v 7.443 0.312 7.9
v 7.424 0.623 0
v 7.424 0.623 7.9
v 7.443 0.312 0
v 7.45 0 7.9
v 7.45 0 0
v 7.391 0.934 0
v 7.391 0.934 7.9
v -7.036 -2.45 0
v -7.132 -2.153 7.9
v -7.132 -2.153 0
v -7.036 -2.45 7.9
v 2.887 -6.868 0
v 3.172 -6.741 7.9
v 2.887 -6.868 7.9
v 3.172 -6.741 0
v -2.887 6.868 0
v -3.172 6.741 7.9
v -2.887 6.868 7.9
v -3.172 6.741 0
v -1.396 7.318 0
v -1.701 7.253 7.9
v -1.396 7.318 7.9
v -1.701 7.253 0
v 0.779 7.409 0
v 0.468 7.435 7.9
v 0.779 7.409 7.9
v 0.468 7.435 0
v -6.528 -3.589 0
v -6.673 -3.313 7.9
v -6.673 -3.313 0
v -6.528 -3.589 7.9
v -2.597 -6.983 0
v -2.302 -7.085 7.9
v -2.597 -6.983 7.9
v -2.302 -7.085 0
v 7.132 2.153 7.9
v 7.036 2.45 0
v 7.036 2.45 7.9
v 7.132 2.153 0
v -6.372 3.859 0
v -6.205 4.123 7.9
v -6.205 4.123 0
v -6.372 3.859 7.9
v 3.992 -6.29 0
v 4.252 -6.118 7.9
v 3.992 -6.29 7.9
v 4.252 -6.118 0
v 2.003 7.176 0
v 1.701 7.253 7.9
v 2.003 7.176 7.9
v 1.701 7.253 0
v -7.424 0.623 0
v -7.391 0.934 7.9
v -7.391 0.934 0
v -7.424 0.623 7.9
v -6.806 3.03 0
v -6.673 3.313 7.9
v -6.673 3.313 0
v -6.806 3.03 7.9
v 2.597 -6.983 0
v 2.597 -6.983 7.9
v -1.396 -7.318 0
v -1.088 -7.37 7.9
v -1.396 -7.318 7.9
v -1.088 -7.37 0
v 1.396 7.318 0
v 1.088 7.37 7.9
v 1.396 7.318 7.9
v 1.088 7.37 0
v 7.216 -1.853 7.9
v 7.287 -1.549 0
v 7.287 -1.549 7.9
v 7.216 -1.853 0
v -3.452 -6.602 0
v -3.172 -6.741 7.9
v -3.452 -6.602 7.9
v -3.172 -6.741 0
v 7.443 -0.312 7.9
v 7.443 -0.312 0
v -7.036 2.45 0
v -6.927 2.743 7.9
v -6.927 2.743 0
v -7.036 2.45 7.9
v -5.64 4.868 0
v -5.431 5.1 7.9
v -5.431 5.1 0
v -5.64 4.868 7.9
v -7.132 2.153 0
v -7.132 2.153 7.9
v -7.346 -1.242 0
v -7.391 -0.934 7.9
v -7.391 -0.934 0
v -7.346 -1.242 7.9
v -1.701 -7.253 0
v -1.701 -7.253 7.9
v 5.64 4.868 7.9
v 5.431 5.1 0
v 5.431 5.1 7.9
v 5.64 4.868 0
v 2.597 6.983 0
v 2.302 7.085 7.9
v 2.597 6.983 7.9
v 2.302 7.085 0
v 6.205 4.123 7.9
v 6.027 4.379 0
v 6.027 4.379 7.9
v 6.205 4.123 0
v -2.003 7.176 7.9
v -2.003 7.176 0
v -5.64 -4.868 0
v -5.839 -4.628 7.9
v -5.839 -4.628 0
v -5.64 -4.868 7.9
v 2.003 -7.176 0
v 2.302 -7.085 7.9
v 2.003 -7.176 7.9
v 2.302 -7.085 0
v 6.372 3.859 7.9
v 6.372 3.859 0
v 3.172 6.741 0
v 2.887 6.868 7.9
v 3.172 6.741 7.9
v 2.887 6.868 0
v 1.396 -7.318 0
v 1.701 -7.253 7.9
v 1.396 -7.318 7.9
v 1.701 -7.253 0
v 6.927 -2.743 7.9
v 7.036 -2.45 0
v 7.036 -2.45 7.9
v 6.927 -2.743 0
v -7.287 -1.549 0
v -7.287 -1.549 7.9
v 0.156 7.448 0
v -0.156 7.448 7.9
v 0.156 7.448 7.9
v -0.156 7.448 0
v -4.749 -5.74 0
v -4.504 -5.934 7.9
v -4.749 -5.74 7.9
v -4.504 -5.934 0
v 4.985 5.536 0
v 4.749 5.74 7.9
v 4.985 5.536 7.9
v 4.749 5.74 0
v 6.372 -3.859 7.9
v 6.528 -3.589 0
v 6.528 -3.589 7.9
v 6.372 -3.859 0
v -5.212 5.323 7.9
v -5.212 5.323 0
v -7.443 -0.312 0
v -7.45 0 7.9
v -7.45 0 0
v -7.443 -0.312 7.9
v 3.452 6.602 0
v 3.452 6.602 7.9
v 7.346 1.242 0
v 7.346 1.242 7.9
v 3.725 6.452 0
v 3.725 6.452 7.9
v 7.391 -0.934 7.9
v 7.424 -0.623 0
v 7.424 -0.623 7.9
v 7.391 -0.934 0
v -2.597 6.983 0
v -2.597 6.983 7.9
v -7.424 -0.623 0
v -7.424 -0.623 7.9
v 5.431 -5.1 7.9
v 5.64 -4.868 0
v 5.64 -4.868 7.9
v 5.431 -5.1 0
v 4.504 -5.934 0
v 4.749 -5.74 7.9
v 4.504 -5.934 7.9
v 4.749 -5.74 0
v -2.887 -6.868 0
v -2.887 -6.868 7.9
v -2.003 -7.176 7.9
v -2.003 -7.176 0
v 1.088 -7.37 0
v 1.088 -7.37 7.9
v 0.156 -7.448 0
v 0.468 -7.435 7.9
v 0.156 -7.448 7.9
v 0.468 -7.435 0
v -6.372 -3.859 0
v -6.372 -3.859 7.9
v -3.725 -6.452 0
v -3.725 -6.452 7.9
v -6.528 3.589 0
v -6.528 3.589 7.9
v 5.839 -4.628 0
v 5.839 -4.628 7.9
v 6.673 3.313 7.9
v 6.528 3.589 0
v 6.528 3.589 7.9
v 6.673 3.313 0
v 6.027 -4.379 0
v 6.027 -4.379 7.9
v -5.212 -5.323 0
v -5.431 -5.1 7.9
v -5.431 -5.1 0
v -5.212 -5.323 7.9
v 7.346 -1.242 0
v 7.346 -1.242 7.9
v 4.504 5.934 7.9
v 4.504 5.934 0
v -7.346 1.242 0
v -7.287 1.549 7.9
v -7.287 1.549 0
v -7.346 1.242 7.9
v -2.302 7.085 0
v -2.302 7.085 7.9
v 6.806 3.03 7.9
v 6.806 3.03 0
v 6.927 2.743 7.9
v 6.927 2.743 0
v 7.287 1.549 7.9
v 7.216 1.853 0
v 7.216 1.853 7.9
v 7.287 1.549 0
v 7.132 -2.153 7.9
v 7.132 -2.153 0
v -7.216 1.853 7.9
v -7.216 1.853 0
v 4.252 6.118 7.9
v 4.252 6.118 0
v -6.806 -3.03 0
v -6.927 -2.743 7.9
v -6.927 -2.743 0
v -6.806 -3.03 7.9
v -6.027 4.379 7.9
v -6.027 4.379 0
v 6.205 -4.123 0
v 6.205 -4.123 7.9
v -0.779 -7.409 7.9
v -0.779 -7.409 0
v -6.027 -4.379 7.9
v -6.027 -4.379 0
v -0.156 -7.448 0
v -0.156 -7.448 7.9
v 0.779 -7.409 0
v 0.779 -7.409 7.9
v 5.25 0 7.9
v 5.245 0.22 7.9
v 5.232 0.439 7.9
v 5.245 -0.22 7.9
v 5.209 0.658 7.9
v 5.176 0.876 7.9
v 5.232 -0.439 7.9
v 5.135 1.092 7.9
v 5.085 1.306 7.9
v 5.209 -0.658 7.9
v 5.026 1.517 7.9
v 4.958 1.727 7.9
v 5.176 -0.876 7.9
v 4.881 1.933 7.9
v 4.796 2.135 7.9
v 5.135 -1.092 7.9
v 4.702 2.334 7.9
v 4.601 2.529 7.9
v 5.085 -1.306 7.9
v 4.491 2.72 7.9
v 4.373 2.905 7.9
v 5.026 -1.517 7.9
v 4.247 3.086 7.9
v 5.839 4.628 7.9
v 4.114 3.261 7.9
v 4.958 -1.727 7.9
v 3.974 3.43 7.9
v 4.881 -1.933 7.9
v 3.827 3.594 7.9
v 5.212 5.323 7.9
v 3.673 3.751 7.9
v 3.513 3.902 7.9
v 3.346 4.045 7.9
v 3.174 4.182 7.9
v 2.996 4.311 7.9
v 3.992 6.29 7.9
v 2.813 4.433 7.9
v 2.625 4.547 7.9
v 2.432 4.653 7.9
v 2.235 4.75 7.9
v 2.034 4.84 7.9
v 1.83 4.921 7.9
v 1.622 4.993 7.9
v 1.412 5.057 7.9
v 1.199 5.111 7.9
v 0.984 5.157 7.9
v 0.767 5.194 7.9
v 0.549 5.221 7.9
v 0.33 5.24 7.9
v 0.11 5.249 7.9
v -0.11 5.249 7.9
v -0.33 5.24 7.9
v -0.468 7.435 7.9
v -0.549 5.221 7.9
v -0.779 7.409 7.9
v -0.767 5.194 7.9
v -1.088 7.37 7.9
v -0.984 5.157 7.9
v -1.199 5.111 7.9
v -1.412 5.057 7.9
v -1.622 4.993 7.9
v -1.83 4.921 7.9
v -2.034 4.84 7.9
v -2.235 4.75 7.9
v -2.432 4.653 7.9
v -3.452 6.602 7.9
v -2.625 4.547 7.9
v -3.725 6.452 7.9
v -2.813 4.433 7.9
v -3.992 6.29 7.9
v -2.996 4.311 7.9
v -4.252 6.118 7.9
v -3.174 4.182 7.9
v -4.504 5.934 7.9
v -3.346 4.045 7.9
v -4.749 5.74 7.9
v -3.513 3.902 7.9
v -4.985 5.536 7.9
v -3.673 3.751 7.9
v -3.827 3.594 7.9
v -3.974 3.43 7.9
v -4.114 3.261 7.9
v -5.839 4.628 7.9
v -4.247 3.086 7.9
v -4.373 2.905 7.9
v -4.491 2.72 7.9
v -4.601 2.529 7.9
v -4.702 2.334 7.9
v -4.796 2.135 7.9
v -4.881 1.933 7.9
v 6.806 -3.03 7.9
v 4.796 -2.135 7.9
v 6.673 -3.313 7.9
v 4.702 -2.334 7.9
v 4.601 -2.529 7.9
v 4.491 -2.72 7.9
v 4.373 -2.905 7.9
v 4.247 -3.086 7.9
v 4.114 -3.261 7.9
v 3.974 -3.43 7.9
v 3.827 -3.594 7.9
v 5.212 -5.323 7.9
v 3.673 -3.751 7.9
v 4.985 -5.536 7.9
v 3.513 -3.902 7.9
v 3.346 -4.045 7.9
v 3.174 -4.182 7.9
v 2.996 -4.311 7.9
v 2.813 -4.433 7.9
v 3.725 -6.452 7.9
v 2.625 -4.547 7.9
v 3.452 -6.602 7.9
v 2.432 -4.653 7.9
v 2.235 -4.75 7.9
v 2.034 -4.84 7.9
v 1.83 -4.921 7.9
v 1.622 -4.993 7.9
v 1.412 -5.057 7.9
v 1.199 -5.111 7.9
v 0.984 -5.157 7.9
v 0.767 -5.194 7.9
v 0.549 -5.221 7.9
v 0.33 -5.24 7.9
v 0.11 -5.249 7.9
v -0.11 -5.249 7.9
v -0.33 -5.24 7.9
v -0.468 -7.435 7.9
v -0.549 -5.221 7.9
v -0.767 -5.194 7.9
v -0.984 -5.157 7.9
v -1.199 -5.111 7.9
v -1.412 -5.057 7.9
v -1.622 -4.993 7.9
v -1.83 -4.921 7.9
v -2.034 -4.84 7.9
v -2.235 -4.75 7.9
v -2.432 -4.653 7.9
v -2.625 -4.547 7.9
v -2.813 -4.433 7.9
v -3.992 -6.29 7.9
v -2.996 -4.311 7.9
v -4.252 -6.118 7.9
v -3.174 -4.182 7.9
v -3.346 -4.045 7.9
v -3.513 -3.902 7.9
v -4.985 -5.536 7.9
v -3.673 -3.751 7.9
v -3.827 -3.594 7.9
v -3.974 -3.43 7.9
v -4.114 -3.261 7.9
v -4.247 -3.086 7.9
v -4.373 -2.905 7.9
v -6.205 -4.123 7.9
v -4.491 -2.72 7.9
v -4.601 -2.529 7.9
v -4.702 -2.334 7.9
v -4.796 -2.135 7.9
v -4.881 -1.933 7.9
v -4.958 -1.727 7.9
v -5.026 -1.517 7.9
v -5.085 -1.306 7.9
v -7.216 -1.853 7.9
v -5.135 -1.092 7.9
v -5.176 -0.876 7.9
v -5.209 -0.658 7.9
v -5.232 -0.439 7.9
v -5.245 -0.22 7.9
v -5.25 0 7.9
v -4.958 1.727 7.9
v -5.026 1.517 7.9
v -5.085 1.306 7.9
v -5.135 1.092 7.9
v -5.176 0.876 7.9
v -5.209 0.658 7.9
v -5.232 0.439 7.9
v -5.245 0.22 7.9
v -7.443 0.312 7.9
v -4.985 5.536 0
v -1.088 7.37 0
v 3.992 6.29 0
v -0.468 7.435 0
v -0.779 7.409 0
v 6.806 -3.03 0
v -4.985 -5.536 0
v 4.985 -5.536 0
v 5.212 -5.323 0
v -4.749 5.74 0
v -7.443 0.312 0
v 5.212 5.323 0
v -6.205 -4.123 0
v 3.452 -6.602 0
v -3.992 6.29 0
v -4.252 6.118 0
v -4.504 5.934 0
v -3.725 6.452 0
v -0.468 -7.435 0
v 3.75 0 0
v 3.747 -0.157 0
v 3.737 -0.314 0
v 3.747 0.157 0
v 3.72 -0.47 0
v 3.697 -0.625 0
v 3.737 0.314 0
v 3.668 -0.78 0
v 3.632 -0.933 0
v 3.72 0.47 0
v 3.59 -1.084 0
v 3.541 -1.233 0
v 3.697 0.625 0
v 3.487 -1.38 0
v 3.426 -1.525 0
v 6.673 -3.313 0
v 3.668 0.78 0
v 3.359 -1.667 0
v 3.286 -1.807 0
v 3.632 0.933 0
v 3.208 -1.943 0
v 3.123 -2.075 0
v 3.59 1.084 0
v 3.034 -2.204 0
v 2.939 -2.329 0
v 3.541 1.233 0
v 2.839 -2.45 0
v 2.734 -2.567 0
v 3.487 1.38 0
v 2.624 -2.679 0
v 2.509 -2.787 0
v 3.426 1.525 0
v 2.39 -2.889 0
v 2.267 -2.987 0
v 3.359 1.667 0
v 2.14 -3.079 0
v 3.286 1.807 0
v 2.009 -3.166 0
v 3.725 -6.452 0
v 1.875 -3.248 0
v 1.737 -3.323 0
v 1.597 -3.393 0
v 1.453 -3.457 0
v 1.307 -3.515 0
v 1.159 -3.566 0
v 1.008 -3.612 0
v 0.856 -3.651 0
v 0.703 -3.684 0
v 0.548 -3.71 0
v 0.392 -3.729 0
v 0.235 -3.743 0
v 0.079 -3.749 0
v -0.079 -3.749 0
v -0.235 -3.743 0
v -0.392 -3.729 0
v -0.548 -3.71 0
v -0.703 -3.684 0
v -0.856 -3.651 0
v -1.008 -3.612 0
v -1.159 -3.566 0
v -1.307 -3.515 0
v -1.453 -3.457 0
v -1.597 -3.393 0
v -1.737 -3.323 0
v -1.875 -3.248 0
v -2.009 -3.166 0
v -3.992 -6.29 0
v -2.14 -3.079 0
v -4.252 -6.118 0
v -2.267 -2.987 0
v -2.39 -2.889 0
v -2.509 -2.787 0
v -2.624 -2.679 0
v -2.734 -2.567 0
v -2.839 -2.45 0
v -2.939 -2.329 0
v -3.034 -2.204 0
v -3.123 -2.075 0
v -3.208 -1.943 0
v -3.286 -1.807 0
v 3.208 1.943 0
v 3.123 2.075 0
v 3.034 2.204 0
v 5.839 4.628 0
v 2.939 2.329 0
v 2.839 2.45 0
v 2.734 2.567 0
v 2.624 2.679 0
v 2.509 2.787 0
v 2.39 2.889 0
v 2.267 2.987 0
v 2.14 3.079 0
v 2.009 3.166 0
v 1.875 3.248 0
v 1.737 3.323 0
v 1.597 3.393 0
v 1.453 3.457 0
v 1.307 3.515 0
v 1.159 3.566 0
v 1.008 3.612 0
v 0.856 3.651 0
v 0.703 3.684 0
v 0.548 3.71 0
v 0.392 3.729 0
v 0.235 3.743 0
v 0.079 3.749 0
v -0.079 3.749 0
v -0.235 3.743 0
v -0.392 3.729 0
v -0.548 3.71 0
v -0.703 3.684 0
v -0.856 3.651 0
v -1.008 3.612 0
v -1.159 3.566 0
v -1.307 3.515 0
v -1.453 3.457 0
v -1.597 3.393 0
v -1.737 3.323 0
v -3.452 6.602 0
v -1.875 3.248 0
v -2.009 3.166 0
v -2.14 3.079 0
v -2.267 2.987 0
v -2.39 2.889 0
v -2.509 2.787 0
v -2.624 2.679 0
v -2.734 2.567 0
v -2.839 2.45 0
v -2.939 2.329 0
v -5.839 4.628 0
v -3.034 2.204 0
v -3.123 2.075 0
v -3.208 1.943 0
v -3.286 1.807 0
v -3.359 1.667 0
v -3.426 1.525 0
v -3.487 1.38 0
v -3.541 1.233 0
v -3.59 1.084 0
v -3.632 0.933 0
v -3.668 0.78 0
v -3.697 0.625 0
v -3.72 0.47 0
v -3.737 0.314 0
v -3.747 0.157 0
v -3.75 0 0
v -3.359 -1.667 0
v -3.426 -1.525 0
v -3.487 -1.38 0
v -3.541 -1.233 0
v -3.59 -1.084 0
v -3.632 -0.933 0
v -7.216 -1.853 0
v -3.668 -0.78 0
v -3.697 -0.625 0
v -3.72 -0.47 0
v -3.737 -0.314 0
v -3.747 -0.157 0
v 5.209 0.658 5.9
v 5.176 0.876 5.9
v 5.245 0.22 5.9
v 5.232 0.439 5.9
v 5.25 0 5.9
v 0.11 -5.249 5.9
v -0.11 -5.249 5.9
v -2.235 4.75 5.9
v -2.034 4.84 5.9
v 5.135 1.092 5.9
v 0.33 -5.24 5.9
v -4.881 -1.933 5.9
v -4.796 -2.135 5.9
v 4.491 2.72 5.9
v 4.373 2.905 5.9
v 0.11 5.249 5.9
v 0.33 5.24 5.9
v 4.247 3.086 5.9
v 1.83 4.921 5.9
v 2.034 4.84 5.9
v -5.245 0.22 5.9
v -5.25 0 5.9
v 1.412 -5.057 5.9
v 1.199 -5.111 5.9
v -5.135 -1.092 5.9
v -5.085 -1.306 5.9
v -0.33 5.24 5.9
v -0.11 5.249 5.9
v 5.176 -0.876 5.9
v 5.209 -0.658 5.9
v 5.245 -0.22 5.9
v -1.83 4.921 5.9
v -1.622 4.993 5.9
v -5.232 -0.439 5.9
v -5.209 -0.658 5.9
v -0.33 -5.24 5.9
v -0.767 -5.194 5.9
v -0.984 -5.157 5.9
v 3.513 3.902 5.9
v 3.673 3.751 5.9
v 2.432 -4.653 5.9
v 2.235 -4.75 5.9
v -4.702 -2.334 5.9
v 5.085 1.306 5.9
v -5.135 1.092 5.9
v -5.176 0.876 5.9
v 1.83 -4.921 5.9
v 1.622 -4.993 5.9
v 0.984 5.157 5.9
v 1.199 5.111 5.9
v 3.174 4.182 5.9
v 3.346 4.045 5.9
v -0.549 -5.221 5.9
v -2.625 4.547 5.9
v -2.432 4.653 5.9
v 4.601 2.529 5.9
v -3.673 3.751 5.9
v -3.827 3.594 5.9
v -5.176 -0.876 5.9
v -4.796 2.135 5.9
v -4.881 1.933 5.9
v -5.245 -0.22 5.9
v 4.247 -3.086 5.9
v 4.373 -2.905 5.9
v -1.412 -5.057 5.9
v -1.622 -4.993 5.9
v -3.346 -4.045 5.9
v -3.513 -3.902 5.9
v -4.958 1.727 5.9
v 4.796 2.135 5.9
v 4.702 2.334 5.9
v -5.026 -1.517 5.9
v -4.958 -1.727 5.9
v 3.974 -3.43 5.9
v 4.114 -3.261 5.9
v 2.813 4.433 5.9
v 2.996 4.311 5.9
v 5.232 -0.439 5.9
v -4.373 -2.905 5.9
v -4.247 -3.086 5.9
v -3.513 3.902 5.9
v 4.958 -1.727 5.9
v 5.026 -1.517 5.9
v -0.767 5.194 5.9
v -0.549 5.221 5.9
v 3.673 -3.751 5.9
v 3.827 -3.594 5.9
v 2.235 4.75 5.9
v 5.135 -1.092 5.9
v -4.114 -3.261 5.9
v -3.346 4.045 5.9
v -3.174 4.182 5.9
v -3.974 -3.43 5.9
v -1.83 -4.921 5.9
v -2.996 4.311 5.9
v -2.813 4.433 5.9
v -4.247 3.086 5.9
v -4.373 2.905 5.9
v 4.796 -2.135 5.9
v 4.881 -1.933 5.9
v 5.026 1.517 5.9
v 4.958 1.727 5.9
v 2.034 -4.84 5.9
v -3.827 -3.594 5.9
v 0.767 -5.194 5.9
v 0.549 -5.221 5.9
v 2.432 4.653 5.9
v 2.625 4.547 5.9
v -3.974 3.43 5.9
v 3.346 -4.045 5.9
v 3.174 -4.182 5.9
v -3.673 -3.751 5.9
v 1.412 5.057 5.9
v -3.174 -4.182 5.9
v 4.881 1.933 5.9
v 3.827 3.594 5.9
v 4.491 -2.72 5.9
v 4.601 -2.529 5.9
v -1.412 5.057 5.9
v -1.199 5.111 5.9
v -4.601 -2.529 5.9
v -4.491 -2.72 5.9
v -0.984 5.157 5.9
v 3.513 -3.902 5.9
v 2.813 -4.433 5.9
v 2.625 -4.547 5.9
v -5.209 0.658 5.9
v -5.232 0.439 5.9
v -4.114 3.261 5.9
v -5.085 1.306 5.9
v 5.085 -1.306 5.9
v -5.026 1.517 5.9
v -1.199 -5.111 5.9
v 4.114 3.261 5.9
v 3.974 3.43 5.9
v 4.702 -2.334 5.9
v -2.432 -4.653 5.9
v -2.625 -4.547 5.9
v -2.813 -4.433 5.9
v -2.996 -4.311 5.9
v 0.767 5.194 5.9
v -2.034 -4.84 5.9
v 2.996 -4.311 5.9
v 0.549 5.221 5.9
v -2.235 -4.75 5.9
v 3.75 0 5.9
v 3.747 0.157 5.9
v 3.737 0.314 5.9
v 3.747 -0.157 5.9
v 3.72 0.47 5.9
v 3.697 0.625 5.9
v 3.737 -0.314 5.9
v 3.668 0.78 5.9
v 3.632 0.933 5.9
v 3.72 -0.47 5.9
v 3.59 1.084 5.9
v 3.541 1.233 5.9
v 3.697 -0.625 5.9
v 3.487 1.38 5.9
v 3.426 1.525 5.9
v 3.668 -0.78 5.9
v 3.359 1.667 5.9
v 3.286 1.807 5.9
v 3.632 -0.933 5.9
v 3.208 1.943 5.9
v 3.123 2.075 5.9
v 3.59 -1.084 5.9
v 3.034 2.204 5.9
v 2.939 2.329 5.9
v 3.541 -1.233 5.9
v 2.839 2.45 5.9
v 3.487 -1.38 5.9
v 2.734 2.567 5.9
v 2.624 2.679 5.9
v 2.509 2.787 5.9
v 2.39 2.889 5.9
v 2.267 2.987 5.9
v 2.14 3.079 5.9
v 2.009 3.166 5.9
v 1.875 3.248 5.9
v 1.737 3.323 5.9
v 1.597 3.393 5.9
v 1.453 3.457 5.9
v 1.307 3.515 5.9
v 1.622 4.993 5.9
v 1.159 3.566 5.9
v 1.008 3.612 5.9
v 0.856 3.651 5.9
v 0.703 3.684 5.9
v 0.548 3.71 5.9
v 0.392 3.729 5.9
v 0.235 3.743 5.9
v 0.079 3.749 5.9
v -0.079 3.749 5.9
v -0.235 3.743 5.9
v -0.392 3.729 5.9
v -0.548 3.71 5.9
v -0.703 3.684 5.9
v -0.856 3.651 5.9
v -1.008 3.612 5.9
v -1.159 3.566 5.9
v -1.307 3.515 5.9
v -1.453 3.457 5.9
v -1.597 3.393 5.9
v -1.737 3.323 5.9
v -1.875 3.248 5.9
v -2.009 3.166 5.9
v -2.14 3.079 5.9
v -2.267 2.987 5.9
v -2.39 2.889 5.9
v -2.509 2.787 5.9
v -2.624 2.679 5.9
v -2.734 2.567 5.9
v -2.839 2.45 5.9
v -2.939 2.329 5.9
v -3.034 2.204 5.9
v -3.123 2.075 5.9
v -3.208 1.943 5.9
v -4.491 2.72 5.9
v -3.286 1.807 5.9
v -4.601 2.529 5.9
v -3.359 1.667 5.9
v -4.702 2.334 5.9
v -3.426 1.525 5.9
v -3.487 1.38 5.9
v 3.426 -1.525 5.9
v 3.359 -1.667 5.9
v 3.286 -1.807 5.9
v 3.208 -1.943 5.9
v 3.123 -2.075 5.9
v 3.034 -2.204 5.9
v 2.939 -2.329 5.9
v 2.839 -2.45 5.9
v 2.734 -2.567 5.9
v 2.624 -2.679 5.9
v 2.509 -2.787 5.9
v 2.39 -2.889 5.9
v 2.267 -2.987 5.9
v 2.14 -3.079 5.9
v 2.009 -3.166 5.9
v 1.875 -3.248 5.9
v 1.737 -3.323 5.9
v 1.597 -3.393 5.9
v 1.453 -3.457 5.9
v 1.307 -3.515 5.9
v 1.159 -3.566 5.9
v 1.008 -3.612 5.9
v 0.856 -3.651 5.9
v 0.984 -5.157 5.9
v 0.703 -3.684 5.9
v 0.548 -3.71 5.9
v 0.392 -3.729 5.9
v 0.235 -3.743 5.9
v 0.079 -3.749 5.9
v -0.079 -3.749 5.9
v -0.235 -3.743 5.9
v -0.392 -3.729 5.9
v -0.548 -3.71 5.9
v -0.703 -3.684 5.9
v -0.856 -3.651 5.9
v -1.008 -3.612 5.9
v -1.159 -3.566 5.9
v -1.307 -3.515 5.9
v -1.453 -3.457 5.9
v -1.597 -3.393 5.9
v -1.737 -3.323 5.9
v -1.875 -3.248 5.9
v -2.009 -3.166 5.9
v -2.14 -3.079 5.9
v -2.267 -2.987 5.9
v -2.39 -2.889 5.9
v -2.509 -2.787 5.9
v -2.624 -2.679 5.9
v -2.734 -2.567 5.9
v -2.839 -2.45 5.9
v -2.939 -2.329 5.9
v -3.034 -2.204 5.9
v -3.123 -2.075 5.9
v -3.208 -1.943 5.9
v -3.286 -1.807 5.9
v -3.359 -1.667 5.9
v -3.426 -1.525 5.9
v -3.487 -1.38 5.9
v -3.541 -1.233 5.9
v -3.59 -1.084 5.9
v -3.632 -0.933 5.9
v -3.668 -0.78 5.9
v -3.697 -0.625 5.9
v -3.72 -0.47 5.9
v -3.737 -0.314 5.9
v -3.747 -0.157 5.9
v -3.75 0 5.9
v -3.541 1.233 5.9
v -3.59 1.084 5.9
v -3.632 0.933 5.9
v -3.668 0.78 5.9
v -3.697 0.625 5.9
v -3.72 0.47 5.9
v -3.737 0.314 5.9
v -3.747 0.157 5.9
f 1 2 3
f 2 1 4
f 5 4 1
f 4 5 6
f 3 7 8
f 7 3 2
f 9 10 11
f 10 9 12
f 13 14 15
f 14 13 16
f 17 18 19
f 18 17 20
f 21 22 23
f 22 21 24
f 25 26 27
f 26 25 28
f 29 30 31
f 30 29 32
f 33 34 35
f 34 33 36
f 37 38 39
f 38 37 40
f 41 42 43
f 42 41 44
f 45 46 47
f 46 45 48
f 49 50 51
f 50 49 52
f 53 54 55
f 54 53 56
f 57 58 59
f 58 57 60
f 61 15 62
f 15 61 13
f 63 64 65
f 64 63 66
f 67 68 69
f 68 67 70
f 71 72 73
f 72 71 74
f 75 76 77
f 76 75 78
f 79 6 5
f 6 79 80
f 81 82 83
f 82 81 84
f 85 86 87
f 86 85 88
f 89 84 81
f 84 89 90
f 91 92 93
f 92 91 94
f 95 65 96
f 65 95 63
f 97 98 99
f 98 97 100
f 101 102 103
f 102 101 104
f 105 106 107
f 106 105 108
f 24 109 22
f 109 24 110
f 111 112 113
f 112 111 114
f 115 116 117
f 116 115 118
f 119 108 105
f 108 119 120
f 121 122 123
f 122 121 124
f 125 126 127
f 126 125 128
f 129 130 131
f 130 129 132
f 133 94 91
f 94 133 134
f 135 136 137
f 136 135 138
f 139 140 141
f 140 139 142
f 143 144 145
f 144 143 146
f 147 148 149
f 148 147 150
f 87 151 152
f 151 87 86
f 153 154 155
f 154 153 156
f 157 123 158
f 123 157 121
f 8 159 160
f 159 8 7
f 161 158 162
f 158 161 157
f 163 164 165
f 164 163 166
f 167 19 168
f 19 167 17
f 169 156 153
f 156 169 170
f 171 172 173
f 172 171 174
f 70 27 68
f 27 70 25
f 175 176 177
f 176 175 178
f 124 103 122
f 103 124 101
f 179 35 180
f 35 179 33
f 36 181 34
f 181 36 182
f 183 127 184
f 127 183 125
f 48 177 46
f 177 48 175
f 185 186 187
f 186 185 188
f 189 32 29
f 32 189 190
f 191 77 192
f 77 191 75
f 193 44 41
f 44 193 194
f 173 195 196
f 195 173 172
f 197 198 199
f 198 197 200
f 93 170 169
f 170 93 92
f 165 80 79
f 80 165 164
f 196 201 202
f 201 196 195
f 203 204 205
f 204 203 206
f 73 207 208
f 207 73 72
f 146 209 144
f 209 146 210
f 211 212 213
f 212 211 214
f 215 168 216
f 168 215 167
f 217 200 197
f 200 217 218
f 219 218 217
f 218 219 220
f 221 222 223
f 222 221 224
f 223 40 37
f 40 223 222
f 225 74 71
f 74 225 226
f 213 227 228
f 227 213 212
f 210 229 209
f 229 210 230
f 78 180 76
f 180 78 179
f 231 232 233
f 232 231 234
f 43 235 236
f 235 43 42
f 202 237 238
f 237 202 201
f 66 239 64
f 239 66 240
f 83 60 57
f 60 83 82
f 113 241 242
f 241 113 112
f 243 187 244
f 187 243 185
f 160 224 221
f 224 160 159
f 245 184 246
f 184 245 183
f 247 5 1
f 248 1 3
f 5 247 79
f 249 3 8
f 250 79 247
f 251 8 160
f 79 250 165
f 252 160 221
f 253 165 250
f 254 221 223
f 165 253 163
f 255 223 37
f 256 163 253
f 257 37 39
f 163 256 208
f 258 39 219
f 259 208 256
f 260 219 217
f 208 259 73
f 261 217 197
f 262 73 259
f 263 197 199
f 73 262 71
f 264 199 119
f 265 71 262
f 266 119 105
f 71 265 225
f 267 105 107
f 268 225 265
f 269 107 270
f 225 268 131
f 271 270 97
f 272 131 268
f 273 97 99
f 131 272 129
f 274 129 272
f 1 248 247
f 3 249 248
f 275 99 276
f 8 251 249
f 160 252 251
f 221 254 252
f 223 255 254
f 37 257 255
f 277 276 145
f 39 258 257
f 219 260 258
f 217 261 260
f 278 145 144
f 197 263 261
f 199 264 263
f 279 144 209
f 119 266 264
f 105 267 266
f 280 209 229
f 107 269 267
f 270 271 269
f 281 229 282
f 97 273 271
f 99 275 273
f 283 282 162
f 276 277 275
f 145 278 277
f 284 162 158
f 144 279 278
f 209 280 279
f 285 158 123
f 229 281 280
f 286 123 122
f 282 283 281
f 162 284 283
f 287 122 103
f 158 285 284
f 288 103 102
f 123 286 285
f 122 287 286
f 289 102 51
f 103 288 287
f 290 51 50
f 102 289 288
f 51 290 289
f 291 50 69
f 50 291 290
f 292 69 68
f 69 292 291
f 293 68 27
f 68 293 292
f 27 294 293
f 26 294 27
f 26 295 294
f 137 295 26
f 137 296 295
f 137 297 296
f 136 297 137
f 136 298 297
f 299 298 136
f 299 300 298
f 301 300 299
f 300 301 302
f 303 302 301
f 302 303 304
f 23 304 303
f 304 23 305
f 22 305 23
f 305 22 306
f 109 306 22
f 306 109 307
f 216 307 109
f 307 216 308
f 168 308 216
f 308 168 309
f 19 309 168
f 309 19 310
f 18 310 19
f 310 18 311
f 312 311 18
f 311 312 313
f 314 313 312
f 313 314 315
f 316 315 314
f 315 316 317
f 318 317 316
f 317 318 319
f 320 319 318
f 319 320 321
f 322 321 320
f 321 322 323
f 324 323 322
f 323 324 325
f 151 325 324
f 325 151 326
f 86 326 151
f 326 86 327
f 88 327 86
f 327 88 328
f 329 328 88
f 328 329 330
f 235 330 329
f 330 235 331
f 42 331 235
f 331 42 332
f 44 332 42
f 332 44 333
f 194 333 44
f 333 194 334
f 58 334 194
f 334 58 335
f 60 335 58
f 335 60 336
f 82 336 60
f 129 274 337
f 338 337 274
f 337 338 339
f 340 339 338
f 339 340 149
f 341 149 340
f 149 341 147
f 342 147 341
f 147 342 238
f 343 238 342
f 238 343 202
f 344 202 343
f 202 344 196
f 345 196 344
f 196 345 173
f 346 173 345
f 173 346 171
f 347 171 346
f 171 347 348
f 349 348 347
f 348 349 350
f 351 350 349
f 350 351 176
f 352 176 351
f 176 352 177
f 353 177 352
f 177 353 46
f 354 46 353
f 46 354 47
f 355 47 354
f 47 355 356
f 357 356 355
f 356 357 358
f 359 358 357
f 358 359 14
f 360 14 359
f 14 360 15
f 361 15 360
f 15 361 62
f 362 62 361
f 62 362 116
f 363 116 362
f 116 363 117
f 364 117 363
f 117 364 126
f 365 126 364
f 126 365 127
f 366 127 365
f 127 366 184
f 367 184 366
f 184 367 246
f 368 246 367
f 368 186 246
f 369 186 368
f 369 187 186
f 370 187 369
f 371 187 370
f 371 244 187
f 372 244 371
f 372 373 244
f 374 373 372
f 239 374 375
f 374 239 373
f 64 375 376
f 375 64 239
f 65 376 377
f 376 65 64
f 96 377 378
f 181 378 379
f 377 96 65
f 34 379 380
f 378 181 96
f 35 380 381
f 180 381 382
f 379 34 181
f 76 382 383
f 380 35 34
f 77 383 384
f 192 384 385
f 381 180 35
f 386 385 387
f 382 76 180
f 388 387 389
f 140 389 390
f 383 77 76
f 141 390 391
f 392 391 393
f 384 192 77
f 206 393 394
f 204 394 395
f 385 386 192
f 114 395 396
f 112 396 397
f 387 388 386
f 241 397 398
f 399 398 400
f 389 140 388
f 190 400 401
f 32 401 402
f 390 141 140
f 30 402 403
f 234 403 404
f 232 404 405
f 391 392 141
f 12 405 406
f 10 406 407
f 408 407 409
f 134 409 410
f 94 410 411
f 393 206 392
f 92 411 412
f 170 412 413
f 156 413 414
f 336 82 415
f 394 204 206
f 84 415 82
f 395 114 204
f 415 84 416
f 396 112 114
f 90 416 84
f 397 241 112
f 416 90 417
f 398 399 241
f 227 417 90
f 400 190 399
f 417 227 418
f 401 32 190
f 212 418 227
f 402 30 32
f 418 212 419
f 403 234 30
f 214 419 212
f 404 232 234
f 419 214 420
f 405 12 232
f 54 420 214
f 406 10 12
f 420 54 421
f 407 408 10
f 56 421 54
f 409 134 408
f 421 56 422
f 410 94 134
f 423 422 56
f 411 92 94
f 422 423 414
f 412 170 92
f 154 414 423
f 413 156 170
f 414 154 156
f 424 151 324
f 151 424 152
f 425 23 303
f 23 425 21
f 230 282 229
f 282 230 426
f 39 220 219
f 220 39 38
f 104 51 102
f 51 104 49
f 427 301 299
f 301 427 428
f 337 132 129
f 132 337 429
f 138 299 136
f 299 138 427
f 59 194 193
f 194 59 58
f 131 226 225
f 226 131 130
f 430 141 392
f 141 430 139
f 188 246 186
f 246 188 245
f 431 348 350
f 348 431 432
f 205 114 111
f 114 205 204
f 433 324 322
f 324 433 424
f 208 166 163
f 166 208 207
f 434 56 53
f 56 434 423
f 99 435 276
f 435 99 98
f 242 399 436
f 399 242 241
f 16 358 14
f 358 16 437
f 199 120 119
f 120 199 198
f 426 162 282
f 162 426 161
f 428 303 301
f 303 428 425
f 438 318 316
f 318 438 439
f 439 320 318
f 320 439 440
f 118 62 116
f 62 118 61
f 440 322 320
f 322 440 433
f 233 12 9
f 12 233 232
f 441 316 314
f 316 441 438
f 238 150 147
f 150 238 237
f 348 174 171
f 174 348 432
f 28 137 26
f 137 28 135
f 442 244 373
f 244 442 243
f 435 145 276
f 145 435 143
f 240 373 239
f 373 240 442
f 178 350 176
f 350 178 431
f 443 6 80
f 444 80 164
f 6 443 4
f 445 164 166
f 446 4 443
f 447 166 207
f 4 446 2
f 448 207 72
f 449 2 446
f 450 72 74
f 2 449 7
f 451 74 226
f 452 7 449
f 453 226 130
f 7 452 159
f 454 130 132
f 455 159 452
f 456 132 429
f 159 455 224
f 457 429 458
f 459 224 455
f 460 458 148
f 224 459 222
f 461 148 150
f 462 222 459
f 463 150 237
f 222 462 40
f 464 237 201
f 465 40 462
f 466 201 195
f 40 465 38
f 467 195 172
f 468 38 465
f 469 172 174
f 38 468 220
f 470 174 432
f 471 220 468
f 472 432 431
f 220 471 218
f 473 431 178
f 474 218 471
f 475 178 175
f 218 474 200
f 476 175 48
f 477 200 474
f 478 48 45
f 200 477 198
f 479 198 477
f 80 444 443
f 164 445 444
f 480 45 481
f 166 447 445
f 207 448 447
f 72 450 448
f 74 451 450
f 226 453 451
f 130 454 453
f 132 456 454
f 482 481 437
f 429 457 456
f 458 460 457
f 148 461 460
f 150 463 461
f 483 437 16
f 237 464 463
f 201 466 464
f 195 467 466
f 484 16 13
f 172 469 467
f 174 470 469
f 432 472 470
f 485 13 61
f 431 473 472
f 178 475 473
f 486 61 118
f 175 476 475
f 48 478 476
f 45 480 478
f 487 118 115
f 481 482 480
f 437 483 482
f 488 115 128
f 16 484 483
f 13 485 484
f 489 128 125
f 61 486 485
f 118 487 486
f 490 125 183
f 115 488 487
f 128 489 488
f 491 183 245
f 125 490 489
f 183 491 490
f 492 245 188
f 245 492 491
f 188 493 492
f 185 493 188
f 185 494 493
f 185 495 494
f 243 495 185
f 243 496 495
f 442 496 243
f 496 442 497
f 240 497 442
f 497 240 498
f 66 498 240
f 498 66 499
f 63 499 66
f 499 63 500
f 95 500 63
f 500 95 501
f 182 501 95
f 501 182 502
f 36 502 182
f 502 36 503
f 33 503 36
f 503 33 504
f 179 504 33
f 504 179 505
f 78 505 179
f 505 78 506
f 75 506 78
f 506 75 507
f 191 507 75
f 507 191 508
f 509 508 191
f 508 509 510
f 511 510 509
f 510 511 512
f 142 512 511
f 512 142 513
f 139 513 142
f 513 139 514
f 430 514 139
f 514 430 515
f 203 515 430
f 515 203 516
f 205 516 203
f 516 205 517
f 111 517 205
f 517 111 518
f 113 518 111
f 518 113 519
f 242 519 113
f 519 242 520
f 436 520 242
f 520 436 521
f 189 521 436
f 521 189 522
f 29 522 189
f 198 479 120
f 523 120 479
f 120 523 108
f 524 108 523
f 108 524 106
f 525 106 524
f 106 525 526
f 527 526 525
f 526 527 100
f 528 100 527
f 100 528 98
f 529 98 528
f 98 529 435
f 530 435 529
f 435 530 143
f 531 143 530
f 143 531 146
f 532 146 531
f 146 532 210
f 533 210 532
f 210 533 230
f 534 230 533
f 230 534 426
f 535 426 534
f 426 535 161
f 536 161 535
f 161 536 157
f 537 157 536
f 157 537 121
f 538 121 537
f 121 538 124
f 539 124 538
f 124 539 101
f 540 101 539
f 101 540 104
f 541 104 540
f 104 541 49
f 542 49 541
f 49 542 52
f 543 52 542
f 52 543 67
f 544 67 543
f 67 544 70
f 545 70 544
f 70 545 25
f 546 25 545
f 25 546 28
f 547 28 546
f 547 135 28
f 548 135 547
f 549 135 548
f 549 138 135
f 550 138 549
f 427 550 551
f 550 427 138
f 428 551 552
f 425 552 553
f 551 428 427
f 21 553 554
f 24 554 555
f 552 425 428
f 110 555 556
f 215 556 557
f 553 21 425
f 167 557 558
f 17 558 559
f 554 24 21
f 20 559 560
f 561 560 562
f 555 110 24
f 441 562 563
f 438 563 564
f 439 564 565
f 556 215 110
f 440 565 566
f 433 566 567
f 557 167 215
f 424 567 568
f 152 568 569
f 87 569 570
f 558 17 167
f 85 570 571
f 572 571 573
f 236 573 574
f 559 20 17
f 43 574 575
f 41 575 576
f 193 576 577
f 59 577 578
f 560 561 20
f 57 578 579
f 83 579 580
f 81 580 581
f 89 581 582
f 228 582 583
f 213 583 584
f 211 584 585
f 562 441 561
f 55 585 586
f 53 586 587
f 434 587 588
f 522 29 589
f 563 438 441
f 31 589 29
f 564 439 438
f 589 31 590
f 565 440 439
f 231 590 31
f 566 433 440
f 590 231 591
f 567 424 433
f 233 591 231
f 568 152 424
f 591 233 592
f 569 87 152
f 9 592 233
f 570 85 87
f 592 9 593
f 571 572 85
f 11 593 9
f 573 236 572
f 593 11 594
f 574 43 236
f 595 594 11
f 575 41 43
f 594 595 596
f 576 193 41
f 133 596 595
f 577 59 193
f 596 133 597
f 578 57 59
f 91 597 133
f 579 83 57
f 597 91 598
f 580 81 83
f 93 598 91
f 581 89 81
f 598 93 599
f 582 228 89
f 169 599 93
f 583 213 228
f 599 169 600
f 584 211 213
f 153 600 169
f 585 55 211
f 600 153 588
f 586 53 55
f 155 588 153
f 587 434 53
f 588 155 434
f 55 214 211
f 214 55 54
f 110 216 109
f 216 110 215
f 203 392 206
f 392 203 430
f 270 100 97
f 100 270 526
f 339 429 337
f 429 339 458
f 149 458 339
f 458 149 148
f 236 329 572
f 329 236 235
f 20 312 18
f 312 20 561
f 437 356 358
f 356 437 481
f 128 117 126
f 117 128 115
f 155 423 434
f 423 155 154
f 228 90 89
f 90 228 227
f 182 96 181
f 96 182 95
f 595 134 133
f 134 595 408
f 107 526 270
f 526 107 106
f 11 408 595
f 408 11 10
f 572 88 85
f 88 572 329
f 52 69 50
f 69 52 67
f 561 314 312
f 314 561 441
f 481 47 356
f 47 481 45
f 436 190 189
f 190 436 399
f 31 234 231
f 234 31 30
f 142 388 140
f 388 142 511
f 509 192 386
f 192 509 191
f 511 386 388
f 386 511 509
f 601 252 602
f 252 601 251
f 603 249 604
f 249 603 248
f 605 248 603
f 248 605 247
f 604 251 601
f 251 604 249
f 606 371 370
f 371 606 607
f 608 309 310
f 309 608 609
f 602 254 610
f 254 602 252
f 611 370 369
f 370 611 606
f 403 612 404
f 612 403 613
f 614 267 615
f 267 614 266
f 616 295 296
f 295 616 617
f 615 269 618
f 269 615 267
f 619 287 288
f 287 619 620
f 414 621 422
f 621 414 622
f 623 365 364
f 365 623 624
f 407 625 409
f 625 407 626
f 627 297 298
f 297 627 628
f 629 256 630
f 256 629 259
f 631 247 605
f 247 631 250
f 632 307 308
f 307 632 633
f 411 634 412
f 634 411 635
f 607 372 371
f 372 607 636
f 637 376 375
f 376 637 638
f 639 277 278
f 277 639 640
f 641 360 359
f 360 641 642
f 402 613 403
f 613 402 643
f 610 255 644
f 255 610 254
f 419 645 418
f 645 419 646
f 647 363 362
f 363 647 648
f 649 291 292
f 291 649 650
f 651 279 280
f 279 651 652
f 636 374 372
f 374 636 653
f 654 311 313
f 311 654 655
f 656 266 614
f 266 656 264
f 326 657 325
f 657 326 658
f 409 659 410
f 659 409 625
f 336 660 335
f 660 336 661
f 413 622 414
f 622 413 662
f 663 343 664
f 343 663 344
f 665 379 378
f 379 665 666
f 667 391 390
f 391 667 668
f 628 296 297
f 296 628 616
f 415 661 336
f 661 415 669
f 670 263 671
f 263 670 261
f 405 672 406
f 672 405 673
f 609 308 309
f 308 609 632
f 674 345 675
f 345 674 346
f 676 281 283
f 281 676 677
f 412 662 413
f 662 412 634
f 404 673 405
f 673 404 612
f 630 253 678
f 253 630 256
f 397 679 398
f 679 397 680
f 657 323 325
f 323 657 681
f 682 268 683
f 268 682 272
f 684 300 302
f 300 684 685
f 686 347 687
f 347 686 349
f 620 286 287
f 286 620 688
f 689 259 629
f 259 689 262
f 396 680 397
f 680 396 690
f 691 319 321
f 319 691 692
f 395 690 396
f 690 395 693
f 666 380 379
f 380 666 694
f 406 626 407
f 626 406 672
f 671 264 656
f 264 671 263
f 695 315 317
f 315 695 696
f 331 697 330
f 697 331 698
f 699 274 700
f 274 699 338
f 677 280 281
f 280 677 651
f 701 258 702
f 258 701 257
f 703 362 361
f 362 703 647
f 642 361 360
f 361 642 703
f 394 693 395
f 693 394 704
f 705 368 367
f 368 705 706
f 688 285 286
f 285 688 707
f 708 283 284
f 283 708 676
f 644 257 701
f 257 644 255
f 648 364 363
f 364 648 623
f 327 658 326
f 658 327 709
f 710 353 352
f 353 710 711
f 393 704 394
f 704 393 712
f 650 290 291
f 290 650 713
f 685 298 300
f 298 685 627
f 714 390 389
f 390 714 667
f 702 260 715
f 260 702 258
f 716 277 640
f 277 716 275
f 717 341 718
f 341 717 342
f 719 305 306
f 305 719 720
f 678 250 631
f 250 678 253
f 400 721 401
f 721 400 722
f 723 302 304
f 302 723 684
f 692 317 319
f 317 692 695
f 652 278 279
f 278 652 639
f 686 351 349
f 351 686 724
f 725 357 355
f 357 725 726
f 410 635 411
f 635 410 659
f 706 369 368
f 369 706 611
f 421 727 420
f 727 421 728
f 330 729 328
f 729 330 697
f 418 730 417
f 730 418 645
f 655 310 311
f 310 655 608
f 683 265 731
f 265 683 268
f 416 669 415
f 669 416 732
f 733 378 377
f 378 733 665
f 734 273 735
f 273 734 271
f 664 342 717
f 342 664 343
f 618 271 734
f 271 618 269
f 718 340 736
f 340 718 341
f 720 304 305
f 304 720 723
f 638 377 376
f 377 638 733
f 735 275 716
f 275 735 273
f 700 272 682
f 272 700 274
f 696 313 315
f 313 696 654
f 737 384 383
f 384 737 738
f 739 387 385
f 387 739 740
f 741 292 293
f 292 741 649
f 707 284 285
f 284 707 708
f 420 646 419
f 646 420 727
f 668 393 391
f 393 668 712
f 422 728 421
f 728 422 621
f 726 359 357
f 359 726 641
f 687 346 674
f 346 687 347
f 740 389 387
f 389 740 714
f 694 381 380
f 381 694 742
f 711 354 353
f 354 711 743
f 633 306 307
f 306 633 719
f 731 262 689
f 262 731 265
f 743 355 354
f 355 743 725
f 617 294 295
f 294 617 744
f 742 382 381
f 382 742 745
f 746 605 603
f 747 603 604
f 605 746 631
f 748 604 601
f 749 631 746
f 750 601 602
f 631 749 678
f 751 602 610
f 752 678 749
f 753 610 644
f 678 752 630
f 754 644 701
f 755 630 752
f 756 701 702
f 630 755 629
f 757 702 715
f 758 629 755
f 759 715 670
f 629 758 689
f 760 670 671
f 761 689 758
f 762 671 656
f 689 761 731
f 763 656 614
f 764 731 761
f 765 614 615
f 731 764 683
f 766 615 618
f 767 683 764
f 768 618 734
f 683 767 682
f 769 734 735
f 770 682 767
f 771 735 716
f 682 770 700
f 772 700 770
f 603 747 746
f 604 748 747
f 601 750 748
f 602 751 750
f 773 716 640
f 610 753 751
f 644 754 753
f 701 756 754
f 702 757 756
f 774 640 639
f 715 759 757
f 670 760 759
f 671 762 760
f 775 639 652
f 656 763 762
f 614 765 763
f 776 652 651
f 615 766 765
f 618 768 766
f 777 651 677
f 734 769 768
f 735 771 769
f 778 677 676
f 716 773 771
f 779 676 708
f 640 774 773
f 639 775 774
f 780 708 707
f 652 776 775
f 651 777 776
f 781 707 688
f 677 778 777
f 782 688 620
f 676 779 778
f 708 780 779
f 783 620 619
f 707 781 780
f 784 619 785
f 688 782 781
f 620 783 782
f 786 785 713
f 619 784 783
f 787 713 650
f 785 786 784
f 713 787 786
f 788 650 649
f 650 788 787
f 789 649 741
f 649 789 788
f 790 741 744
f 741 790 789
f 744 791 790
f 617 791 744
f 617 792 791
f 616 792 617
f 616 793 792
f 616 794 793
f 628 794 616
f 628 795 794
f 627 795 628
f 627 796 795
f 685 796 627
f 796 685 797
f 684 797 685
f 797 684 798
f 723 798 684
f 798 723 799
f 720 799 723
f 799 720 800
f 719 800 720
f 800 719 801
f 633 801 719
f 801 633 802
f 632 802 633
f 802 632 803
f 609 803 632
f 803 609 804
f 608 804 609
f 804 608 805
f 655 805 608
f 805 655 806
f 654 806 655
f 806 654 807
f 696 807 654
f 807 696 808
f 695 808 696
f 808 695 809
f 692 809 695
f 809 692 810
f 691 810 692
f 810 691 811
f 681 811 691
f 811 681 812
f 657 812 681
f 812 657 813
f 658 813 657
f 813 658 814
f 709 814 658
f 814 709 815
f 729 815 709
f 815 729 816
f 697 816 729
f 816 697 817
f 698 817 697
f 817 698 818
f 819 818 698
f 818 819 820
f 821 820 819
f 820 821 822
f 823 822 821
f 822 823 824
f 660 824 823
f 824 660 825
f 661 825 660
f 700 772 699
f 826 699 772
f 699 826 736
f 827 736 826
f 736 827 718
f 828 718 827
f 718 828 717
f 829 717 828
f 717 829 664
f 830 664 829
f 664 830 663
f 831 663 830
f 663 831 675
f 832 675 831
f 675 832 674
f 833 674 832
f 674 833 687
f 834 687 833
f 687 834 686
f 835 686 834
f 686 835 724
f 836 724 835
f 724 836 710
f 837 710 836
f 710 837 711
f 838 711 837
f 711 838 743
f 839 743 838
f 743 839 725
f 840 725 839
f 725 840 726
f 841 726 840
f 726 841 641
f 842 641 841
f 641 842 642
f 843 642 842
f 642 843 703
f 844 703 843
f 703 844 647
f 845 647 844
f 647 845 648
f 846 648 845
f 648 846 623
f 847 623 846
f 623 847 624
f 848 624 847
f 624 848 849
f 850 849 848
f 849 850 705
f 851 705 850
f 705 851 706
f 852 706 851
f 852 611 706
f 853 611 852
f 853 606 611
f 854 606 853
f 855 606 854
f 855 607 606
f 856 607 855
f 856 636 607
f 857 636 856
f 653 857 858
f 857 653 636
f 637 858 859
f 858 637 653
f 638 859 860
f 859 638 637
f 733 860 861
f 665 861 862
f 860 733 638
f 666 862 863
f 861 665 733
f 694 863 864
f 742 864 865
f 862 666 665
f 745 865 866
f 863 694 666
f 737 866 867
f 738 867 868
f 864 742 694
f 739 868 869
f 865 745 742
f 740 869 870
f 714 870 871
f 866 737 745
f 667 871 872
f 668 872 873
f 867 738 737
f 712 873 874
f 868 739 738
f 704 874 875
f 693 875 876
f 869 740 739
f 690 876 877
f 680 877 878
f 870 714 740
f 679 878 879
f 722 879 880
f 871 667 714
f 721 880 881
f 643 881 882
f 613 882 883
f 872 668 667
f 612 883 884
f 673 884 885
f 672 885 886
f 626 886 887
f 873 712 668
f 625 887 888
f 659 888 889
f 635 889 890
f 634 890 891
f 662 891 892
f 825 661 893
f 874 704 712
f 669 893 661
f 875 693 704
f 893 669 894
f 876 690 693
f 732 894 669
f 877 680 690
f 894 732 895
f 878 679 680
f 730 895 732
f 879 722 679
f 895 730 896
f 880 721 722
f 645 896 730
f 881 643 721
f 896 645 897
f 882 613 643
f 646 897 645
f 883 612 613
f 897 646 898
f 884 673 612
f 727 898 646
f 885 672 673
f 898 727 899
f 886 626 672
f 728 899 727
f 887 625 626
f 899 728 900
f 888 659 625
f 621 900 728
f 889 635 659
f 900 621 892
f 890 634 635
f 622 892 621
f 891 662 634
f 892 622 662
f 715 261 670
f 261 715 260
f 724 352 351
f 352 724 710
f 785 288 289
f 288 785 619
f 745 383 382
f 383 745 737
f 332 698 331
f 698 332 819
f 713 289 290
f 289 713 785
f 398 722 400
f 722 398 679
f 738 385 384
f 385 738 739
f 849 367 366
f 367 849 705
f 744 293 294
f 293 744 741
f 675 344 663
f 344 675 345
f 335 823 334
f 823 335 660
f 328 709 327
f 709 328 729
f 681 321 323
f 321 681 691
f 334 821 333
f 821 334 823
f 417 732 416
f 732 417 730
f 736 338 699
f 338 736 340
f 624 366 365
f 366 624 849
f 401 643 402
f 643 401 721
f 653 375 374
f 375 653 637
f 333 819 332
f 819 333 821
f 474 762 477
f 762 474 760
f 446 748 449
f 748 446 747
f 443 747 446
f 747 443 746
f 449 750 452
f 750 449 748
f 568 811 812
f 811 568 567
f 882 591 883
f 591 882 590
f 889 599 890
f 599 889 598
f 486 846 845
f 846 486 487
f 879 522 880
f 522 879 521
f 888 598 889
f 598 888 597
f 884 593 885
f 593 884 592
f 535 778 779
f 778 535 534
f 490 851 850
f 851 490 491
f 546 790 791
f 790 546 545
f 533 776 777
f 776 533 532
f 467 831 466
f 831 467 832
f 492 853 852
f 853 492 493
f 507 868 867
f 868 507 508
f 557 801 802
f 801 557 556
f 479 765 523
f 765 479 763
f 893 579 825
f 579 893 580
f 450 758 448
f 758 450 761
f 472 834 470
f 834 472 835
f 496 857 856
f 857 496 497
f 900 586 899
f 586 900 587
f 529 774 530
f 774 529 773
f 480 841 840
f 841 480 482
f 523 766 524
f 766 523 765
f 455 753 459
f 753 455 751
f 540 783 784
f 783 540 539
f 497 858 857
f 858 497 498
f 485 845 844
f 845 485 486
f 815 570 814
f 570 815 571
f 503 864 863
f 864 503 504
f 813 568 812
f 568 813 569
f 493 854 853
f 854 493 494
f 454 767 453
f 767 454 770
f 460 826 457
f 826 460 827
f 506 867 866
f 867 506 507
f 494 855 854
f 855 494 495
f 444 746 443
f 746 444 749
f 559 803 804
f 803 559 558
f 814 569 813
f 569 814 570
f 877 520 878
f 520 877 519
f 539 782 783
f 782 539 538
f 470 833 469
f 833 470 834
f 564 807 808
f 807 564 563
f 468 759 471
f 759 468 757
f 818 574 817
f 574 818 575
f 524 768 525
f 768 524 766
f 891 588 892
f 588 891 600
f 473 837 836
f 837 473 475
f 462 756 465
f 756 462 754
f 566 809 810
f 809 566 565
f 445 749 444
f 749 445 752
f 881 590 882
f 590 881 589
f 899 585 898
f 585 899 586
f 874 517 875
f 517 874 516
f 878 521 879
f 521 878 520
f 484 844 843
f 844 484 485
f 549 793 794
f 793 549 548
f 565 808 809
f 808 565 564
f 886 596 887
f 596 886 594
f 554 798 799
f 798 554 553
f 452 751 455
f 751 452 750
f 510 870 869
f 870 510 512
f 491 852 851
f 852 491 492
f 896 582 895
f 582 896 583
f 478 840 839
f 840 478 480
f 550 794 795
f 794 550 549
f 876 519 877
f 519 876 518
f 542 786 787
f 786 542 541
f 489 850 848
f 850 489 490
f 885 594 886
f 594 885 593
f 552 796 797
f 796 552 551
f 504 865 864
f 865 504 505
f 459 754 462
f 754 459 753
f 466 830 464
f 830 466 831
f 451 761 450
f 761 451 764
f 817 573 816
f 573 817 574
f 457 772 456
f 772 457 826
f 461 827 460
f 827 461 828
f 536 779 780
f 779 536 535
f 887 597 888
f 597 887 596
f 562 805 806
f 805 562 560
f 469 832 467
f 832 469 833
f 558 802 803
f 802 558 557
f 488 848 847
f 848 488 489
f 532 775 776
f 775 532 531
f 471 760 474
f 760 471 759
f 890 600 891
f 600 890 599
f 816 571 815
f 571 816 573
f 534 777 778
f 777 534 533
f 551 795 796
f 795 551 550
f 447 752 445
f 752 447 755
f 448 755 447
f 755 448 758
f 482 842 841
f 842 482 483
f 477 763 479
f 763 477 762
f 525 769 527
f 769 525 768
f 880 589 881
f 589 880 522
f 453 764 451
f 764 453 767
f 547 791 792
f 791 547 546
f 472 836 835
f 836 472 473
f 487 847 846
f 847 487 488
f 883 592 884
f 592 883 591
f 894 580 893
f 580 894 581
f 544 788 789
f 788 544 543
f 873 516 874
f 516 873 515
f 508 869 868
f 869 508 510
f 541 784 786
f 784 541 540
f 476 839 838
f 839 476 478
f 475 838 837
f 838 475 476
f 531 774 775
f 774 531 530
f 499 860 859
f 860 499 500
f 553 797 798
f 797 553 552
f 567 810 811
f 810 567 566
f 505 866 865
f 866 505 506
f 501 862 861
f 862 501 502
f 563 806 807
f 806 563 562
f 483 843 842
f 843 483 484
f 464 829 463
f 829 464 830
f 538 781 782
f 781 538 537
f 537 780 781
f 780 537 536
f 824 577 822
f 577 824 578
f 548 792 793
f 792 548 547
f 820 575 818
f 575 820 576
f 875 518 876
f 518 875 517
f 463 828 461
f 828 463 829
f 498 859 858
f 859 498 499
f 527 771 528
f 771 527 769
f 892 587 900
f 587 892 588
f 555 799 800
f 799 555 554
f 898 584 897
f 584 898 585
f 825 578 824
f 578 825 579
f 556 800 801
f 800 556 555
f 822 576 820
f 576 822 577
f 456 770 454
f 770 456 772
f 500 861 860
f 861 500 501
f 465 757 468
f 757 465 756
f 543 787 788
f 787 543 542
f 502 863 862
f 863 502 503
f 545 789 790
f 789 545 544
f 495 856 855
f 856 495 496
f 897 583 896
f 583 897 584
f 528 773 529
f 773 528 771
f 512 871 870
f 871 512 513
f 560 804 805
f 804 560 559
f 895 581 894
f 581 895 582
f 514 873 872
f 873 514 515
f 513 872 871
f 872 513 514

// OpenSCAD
$fn = 150;

difference() {
	cylinder(d = 14.9, h = 7.9);
	translate(v = [0, 0, 5.9]) {
		cylinder(d = 10.5, h = 3);
	}
	translate(v = [0, 0, -2.5]) {
		cylinder(d = 7.5, h = 12.9);
	}
}
